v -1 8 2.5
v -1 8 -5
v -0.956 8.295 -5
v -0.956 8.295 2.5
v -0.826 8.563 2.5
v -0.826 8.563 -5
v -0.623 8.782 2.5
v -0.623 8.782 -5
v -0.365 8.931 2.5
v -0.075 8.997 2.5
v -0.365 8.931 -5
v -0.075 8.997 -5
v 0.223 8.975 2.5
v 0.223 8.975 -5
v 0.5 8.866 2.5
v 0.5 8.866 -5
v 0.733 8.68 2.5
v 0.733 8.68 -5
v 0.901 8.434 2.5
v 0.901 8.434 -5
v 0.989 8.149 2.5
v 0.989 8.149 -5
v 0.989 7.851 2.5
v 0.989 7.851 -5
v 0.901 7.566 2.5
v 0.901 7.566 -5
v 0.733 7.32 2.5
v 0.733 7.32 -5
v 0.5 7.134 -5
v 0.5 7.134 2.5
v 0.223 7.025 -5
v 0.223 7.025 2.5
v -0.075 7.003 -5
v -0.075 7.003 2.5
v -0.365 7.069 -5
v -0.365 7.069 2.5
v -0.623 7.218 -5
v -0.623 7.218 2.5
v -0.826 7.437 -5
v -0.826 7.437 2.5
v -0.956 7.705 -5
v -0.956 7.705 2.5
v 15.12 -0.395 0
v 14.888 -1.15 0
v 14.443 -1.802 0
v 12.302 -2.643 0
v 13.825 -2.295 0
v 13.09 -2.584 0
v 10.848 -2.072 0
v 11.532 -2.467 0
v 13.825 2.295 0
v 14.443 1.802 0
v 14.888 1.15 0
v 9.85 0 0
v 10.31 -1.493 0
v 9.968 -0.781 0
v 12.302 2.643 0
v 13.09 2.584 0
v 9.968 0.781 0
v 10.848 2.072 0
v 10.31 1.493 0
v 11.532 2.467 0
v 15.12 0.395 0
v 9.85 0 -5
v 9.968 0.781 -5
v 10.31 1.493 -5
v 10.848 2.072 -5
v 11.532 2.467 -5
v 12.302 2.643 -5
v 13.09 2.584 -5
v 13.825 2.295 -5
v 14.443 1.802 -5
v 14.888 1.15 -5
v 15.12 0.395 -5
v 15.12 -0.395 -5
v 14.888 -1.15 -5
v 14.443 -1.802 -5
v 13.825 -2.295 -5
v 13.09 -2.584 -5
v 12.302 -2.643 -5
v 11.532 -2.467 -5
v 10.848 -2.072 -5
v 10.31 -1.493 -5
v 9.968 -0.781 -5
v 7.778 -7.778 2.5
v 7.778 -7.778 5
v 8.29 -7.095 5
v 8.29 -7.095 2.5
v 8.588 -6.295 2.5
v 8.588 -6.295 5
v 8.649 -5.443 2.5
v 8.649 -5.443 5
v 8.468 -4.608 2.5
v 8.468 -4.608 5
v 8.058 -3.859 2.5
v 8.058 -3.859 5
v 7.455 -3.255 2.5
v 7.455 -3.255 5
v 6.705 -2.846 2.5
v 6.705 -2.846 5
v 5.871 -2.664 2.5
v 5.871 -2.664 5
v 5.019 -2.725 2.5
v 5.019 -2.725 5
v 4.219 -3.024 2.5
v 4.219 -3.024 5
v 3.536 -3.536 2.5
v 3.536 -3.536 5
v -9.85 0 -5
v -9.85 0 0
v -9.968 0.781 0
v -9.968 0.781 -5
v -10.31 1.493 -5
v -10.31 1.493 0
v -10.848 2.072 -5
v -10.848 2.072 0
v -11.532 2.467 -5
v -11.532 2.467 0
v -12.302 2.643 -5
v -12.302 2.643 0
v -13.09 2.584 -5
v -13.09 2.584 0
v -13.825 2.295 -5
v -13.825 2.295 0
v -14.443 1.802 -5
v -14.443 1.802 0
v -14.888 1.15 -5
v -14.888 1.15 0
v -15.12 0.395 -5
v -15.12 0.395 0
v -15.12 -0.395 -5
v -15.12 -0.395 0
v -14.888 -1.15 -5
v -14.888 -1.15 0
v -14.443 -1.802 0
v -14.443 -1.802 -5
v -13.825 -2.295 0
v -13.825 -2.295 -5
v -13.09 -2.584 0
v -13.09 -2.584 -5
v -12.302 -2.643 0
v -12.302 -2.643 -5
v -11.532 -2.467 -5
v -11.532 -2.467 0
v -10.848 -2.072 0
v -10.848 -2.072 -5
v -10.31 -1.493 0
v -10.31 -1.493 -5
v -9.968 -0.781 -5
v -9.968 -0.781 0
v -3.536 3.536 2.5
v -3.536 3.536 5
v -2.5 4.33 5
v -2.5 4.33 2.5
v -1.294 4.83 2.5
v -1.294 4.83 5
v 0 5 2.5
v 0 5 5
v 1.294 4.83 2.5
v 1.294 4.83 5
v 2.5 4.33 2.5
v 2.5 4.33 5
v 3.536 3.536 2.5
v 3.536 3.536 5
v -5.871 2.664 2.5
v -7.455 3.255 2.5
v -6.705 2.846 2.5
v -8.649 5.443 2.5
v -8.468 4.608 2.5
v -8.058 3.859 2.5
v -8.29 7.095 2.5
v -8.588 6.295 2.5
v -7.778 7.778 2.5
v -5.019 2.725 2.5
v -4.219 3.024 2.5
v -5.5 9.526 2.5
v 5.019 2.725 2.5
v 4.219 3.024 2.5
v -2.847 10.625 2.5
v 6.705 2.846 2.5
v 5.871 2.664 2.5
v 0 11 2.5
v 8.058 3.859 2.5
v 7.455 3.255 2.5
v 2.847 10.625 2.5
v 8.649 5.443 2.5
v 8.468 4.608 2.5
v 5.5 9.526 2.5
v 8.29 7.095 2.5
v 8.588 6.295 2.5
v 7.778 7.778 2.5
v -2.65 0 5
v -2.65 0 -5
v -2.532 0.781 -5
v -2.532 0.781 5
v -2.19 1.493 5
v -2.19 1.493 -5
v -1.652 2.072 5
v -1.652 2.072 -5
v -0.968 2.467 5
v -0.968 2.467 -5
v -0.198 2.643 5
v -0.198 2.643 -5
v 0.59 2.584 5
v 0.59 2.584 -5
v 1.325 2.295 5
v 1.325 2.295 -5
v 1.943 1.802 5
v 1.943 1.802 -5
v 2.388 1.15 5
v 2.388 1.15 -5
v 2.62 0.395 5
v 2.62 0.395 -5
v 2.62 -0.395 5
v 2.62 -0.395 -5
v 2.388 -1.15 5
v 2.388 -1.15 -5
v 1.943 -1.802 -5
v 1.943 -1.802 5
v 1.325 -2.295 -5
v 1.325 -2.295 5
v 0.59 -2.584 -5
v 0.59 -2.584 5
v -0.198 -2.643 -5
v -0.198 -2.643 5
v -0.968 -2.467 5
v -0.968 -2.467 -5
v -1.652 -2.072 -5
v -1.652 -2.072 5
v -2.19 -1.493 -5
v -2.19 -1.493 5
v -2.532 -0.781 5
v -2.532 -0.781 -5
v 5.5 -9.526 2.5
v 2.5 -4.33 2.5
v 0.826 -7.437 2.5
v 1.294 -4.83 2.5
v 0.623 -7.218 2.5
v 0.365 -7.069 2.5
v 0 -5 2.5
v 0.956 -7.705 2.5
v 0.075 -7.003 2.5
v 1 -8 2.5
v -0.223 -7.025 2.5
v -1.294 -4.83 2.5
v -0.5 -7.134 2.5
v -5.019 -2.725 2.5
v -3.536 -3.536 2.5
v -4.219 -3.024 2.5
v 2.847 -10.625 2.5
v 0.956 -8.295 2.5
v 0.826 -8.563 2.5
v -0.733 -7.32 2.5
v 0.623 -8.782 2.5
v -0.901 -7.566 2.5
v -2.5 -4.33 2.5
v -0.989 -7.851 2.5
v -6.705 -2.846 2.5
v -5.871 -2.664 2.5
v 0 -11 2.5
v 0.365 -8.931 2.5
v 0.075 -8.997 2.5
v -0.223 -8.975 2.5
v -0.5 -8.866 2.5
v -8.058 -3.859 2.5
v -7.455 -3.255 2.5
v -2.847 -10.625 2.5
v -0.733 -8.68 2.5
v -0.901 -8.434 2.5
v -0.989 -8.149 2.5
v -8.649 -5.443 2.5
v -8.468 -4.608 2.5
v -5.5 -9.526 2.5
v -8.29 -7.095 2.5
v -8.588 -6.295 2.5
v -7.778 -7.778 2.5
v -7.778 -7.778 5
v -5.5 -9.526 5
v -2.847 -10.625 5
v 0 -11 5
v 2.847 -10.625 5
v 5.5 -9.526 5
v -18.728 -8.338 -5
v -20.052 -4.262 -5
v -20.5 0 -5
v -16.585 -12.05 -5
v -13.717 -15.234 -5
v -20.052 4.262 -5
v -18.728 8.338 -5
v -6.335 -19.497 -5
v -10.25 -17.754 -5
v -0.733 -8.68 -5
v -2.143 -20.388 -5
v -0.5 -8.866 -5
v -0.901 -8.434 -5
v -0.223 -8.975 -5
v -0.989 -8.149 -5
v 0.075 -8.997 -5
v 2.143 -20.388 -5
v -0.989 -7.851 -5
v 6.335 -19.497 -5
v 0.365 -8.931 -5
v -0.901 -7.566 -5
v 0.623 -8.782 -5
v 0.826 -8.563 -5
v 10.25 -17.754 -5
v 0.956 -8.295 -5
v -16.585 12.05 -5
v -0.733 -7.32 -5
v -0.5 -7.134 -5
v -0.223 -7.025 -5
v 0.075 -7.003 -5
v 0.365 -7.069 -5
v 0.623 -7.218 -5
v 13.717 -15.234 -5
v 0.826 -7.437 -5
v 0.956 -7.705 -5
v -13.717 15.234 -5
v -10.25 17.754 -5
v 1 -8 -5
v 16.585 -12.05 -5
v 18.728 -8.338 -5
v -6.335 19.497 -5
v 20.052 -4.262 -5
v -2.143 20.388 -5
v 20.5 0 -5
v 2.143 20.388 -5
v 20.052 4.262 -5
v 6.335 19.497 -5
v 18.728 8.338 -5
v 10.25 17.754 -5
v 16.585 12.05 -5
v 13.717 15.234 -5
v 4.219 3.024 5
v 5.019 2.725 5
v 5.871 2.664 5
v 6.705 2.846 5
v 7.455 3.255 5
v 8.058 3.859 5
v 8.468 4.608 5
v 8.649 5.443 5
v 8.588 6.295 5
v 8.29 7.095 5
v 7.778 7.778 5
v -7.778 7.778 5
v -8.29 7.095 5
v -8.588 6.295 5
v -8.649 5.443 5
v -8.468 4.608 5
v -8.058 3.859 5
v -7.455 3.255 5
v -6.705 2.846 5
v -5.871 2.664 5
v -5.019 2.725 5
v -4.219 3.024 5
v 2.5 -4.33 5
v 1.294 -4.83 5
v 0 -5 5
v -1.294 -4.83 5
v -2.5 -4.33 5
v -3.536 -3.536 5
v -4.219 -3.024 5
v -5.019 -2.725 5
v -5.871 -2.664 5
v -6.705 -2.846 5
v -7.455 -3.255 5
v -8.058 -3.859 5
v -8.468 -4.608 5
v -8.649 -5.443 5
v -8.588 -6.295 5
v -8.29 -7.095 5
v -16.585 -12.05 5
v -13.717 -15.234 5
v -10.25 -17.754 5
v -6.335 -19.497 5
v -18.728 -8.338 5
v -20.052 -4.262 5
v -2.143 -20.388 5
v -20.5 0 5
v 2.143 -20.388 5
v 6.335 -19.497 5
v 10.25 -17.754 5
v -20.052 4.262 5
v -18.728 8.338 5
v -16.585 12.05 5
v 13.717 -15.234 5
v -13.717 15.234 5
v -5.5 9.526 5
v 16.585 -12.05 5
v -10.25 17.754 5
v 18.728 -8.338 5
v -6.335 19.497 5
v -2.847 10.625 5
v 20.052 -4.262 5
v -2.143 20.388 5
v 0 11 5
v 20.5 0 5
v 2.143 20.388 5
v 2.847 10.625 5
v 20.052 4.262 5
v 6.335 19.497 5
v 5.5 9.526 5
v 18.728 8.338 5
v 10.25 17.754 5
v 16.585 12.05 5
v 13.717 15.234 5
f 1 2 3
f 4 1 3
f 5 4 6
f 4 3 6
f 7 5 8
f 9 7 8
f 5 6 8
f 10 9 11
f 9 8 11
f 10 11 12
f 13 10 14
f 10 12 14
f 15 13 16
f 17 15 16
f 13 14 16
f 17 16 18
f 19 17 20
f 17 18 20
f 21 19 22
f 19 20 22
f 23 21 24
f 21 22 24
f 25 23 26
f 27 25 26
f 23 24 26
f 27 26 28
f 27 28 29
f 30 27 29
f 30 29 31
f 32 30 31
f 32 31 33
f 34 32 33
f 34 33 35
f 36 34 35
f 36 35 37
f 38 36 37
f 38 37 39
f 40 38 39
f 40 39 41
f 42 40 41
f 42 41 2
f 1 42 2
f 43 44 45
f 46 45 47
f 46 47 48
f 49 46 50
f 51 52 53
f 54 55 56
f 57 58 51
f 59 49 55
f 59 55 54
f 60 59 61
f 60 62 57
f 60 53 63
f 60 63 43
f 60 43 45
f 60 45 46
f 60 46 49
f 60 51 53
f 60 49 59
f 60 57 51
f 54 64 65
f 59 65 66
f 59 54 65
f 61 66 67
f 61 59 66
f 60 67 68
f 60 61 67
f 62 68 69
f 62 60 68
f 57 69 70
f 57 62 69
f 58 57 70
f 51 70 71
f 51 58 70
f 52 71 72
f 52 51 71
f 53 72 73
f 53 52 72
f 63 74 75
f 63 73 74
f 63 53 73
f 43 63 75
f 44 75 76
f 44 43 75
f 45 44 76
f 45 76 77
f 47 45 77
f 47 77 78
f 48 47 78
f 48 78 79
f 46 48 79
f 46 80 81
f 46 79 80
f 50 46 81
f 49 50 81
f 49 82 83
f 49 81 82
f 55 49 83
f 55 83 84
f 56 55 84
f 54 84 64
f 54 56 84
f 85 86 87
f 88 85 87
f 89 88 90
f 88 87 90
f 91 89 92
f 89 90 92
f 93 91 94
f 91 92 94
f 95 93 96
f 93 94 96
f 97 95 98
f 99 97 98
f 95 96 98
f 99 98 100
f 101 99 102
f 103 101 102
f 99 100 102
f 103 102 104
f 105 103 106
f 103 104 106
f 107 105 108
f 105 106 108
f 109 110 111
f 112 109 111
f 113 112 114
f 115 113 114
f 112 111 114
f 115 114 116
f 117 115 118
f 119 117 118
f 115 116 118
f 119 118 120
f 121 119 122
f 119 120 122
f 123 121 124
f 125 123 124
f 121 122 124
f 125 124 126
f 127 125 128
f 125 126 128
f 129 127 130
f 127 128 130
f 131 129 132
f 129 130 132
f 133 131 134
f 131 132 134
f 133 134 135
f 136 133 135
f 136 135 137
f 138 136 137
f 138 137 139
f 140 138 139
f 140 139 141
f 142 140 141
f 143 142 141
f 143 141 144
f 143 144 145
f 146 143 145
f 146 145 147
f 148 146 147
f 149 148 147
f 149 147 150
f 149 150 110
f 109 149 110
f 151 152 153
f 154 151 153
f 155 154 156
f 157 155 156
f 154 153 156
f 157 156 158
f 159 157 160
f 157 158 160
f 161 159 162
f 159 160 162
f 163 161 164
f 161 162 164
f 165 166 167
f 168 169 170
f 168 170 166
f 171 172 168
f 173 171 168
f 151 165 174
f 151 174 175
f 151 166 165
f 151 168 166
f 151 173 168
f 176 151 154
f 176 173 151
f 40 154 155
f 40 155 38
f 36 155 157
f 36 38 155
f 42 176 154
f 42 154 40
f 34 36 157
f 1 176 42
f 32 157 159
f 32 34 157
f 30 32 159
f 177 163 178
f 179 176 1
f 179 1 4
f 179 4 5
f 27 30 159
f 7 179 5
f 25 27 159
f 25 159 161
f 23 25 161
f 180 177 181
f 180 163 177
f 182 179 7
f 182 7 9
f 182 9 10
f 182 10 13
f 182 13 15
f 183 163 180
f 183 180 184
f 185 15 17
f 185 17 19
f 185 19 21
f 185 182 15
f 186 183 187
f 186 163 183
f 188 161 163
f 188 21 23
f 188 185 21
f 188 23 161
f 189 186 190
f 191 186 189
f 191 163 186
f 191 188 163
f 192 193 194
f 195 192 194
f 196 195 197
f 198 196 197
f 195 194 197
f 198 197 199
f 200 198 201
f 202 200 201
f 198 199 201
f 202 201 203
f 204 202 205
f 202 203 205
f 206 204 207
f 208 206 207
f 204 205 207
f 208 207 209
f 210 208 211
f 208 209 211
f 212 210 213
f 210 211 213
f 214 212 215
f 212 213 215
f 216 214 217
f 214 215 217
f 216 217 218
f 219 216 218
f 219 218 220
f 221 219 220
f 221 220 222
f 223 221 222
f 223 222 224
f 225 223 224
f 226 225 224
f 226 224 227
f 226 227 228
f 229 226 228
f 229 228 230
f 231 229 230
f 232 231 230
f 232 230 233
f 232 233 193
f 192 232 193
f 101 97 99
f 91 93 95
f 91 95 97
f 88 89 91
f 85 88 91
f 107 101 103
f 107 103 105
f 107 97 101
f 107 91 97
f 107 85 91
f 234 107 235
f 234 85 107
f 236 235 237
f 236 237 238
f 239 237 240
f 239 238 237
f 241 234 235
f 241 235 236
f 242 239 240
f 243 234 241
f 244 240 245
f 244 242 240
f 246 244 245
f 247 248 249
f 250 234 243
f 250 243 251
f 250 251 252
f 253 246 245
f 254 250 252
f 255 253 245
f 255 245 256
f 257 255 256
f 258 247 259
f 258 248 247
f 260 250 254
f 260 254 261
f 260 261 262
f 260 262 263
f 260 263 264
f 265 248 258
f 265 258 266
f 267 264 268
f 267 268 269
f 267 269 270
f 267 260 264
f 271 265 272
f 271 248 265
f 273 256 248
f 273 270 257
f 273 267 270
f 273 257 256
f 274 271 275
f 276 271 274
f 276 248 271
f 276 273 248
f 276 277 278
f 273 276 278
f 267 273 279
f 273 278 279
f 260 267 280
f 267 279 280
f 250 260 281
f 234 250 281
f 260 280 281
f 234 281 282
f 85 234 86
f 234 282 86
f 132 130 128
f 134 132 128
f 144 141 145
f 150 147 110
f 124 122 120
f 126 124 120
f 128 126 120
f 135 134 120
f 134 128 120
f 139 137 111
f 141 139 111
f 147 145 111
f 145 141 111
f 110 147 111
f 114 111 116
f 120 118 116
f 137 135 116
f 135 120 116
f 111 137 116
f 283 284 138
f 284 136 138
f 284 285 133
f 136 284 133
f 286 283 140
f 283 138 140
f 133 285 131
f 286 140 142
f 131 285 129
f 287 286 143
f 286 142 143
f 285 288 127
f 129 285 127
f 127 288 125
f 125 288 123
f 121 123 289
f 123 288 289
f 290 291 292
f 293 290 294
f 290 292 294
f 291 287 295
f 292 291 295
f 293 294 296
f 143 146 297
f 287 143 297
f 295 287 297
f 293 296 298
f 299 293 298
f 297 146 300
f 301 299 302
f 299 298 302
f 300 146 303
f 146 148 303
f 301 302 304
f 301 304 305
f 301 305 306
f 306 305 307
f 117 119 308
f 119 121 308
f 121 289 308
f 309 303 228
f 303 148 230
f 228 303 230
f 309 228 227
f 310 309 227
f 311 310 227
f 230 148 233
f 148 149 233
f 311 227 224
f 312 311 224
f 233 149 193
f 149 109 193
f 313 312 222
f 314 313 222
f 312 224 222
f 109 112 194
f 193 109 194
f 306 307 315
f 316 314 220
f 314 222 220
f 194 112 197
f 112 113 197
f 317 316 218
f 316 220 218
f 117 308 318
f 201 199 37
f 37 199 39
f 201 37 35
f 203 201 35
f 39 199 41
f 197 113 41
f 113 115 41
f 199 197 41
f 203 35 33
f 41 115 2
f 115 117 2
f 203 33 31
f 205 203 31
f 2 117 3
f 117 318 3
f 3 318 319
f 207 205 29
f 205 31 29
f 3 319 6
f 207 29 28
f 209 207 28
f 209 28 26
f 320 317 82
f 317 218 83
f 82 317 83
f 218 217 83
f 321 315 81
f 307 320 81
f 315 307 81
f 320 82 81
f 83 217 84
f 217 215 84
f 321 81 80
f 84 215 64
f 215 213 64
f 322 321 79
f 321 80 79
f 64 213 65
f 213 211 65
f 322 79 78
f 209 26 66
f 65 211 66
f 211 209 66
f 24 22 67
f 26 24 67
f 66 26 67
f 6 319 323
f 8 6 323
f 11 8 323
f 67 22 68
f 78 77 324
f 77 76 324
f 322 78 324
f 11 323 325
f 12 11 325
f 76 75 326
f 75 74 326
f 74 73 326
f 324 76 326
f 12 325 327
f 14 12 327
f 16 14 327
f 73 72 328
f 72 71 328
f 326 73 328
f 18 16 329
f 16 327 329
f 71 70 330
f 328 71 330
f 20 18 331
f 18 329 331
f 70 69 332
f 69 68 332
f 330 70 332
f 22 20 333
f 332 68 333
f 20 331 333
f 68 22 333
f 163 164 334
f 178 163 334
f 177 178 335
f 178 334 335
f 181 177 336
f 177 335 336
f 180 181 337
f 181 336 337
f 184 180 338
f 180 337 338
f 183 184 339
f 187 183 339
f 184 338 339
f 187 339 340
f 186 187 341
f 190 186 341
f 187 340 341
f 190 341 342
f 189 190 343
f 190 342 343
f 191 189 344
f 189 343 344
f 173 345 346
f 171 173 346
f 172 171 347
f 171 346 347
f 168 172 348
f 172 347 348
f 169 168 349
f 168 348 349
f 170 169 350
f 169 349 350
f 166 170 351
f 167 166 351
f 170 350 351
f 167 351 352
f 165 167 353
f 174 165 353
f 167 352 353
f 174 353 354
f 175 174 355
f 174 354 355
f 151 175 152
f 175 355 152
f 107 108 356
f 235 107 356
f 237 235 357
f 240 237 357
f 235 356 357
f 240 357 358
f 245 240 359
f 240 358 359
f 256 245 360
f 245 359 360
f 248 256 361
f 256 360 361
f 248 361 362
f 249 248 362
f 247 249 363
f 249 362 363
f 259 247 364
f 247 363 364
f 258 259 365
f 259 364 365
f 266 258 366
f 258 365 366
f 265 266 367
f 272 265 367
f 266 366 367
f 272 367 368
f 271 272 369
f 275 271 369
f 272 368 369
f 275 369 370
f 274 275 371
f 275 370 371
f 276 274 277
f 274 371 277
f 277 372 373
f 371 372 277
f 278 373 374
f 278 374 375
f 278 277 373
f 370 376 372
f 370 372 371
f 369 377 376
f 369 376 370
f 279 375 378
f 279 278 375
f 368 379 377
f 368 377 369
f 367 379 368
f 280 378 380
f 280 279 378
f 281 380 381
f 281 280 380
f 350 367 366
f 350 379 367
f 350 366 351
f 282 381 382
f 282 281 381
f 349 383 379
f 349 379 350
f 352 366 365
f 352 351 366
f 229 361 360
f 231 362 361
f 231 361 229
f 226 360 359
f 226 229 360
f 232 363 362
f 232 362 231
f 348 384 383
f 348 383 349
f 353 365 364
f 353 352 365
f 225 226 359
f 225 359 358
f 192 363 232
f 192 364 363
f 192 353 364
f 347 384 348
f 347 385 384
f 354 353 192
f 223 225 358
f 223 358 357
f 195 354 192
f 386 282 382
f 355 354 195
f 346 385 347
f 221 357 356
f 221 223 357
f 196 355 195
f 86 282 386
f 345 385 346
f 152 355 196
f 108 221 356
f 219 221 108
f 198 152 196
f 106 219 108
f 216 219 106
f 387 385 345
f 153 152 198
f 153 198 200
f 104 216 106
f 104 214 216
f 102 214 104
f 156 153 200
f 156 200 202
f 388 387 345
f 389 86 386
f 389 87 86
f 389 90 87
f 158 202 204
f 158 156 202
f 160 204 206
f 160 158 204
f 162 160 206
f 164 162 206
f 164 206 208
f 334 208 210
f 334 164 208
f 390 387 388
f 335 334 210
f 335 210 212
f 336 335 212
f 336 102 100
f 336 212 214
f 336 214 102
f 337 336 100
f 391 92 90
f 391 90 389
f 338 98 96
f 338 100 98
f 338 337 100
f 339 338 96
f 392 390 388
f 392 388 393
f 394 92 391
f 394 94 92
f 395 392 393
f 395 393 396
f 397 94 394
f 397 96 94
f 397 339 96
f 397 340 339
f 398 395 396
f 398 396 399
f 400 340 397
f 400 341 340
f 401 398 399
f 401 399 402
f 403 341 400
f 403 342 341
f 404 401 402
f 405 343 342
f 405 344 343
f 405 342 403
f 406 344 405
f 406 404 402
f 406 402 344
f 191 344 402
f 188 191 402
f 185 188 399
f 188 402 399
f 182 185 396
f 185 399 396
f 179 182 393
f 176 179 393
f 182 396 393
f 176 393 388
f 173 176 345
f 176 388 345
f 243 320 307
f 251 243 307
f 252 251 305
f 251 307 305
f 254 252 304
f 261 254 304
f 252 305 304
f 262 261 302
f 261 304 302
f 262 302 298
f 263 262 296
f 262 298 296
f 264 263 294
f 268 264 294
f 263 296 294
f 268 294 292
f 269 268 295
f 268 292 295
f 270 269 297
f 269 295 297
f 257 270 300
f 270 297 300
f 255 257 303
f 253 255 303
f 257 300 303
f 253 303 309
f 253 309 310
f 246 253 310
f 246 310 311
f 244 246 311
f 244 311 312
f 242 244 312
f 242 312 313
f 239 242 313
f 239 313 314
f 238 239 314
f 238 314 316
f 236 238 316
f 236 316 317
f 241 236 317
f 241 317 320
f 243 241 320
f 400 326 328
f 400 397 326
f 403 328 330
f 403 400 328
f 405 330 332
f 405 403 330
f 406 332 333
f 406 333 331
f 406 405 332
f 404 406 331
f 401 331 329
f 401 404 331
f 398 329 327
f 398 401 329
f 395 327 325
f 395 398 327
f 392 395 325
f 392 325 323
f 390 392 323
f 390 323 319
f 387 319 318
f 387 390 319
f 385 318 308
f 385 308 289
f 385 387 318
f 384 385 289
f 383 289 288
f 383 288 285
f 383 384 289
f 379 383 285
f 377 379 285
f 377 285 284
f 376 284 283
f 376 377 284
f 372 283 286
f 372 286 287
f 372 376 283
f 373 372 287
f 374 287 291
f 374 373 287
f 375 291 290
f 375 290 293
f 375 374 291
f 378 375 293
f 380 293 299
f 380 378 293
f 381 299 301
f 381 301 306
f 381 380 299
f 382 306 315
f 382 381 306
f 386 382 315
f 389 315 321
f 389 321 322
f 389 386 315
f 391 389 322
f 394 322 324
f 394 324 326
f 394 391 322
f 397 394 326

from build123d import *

# Parameters (mm, degrees)
SKETCH_1_R               = 20.5
EXTRUDE_1_DEPTH          = 5
HOLE_WIZARD_M5_1_D       = 5.3
HOLE_WIZARD_M5_2_D       = 5.3
HOLE_WIZARD_M5_2_DEPTH   = 5
CUT_EXTRUDE_1_DEPTH      = 2.5
HOLE_WIZARD_2_0_2_1_D    = 2
PATTERN_CIRCULAR_1_COUNT = 2


with BuildPart() as part:
    # 스케치1 → 보스-돌출1 (new, symmetric)
    with BuildSketch(Plane.XY):
        Circle(SKETCH_1_R)
    extrude(amount=EXTRUDE_1_DEPTH, both=True)

    # M5 여유 구멍1 (through all)
    with Locations(Plane.XY.offset(5)):
        with Locations((0, 0)):
            Hole(HOLE_WIZARD_M5_1_D / 2)

    # M5 여유 구멍2
    with Locations(Plane(origin=(0, 0, -5), x_dir=(-1, 0, 0), z_dir=(0, 0, -1))):
        with Locations((12.5, 0)):
            hole_wizard_m5_2 = Hole(HOLE_WIZARD_M5_2_D / 2, depth=HOLE_WIZARD_M5_2_DEPTH)

    # 대칭 복사1: M5 여유 구멍2 across plane
    add(hole_wizard_m5_2.mirror(Plane(origin=(0, 0, 0), x_dir=(0, 0, 1), z_dir=(1, 0, 0))), mode=Mode.SUBTRACT)

    # 스케치6 → 컷-돌출1 (cut)
    with BuildSketch(Plane.XY.offset(5)):
        with BuildLine():
            ThreePointArc((7.778174593, 7.778174593), (0, 11), (-7.778174593, 7.778174593))
            ThreePointArc((-7.778174593, 7.778174593), (-7.778174593, 3.535533906), (-3.535533906, 3.535533906))
            ThreePointArc((-3.535533906, 3.535533906), (0, 5), (3.535533906, 3.535533906))
            ThreePointArc((3.535533906, 3.535533906), (7.778174593, 3.535533906), (7.778174593, 7.778174593))
        make_face()
    cut_extrude_1 = extrude(amount=-CUT_EXTRUDE_1_DEPTH, mode=Mode.SUBTRACT)

    # Ø2.0 (2) 지름 구멍1 (through all)
    with Locations(Plane.XY.offset(2.5)):
        with Locations((0, 8)):
            hole_wizard_2_0_2_1 = Hole(HOLE_WIZARD_2_0_2_1_D / 2)

    # 원형 패턴1: 컷-돌출1, Ø2.0 (2) 지름 구멍1 ×2 about axis
    pattern_circular_1_axis = Axis((0, 0, 0), (0, 0, 1))
    add([cut_extrude_1.rotate(pattern_circular_1_axis, i * 360 / PATTERN_CIRCULAR_1_COUNT) for i in range(1, PATTERN_CIRCULAR_1_COUNT)], mode=Mode.SUBTRACT)
    add([hole_wizard_2_0_2_1.rotate(pattern_circular_1_axis, i * 360 / PATTERN_CIRCULAR_1_COUNT) for i in range(1, PATTERN_CIRCULAR_1_COUNT)], mode=Mode.SUBTRACT)


solid = part.part
